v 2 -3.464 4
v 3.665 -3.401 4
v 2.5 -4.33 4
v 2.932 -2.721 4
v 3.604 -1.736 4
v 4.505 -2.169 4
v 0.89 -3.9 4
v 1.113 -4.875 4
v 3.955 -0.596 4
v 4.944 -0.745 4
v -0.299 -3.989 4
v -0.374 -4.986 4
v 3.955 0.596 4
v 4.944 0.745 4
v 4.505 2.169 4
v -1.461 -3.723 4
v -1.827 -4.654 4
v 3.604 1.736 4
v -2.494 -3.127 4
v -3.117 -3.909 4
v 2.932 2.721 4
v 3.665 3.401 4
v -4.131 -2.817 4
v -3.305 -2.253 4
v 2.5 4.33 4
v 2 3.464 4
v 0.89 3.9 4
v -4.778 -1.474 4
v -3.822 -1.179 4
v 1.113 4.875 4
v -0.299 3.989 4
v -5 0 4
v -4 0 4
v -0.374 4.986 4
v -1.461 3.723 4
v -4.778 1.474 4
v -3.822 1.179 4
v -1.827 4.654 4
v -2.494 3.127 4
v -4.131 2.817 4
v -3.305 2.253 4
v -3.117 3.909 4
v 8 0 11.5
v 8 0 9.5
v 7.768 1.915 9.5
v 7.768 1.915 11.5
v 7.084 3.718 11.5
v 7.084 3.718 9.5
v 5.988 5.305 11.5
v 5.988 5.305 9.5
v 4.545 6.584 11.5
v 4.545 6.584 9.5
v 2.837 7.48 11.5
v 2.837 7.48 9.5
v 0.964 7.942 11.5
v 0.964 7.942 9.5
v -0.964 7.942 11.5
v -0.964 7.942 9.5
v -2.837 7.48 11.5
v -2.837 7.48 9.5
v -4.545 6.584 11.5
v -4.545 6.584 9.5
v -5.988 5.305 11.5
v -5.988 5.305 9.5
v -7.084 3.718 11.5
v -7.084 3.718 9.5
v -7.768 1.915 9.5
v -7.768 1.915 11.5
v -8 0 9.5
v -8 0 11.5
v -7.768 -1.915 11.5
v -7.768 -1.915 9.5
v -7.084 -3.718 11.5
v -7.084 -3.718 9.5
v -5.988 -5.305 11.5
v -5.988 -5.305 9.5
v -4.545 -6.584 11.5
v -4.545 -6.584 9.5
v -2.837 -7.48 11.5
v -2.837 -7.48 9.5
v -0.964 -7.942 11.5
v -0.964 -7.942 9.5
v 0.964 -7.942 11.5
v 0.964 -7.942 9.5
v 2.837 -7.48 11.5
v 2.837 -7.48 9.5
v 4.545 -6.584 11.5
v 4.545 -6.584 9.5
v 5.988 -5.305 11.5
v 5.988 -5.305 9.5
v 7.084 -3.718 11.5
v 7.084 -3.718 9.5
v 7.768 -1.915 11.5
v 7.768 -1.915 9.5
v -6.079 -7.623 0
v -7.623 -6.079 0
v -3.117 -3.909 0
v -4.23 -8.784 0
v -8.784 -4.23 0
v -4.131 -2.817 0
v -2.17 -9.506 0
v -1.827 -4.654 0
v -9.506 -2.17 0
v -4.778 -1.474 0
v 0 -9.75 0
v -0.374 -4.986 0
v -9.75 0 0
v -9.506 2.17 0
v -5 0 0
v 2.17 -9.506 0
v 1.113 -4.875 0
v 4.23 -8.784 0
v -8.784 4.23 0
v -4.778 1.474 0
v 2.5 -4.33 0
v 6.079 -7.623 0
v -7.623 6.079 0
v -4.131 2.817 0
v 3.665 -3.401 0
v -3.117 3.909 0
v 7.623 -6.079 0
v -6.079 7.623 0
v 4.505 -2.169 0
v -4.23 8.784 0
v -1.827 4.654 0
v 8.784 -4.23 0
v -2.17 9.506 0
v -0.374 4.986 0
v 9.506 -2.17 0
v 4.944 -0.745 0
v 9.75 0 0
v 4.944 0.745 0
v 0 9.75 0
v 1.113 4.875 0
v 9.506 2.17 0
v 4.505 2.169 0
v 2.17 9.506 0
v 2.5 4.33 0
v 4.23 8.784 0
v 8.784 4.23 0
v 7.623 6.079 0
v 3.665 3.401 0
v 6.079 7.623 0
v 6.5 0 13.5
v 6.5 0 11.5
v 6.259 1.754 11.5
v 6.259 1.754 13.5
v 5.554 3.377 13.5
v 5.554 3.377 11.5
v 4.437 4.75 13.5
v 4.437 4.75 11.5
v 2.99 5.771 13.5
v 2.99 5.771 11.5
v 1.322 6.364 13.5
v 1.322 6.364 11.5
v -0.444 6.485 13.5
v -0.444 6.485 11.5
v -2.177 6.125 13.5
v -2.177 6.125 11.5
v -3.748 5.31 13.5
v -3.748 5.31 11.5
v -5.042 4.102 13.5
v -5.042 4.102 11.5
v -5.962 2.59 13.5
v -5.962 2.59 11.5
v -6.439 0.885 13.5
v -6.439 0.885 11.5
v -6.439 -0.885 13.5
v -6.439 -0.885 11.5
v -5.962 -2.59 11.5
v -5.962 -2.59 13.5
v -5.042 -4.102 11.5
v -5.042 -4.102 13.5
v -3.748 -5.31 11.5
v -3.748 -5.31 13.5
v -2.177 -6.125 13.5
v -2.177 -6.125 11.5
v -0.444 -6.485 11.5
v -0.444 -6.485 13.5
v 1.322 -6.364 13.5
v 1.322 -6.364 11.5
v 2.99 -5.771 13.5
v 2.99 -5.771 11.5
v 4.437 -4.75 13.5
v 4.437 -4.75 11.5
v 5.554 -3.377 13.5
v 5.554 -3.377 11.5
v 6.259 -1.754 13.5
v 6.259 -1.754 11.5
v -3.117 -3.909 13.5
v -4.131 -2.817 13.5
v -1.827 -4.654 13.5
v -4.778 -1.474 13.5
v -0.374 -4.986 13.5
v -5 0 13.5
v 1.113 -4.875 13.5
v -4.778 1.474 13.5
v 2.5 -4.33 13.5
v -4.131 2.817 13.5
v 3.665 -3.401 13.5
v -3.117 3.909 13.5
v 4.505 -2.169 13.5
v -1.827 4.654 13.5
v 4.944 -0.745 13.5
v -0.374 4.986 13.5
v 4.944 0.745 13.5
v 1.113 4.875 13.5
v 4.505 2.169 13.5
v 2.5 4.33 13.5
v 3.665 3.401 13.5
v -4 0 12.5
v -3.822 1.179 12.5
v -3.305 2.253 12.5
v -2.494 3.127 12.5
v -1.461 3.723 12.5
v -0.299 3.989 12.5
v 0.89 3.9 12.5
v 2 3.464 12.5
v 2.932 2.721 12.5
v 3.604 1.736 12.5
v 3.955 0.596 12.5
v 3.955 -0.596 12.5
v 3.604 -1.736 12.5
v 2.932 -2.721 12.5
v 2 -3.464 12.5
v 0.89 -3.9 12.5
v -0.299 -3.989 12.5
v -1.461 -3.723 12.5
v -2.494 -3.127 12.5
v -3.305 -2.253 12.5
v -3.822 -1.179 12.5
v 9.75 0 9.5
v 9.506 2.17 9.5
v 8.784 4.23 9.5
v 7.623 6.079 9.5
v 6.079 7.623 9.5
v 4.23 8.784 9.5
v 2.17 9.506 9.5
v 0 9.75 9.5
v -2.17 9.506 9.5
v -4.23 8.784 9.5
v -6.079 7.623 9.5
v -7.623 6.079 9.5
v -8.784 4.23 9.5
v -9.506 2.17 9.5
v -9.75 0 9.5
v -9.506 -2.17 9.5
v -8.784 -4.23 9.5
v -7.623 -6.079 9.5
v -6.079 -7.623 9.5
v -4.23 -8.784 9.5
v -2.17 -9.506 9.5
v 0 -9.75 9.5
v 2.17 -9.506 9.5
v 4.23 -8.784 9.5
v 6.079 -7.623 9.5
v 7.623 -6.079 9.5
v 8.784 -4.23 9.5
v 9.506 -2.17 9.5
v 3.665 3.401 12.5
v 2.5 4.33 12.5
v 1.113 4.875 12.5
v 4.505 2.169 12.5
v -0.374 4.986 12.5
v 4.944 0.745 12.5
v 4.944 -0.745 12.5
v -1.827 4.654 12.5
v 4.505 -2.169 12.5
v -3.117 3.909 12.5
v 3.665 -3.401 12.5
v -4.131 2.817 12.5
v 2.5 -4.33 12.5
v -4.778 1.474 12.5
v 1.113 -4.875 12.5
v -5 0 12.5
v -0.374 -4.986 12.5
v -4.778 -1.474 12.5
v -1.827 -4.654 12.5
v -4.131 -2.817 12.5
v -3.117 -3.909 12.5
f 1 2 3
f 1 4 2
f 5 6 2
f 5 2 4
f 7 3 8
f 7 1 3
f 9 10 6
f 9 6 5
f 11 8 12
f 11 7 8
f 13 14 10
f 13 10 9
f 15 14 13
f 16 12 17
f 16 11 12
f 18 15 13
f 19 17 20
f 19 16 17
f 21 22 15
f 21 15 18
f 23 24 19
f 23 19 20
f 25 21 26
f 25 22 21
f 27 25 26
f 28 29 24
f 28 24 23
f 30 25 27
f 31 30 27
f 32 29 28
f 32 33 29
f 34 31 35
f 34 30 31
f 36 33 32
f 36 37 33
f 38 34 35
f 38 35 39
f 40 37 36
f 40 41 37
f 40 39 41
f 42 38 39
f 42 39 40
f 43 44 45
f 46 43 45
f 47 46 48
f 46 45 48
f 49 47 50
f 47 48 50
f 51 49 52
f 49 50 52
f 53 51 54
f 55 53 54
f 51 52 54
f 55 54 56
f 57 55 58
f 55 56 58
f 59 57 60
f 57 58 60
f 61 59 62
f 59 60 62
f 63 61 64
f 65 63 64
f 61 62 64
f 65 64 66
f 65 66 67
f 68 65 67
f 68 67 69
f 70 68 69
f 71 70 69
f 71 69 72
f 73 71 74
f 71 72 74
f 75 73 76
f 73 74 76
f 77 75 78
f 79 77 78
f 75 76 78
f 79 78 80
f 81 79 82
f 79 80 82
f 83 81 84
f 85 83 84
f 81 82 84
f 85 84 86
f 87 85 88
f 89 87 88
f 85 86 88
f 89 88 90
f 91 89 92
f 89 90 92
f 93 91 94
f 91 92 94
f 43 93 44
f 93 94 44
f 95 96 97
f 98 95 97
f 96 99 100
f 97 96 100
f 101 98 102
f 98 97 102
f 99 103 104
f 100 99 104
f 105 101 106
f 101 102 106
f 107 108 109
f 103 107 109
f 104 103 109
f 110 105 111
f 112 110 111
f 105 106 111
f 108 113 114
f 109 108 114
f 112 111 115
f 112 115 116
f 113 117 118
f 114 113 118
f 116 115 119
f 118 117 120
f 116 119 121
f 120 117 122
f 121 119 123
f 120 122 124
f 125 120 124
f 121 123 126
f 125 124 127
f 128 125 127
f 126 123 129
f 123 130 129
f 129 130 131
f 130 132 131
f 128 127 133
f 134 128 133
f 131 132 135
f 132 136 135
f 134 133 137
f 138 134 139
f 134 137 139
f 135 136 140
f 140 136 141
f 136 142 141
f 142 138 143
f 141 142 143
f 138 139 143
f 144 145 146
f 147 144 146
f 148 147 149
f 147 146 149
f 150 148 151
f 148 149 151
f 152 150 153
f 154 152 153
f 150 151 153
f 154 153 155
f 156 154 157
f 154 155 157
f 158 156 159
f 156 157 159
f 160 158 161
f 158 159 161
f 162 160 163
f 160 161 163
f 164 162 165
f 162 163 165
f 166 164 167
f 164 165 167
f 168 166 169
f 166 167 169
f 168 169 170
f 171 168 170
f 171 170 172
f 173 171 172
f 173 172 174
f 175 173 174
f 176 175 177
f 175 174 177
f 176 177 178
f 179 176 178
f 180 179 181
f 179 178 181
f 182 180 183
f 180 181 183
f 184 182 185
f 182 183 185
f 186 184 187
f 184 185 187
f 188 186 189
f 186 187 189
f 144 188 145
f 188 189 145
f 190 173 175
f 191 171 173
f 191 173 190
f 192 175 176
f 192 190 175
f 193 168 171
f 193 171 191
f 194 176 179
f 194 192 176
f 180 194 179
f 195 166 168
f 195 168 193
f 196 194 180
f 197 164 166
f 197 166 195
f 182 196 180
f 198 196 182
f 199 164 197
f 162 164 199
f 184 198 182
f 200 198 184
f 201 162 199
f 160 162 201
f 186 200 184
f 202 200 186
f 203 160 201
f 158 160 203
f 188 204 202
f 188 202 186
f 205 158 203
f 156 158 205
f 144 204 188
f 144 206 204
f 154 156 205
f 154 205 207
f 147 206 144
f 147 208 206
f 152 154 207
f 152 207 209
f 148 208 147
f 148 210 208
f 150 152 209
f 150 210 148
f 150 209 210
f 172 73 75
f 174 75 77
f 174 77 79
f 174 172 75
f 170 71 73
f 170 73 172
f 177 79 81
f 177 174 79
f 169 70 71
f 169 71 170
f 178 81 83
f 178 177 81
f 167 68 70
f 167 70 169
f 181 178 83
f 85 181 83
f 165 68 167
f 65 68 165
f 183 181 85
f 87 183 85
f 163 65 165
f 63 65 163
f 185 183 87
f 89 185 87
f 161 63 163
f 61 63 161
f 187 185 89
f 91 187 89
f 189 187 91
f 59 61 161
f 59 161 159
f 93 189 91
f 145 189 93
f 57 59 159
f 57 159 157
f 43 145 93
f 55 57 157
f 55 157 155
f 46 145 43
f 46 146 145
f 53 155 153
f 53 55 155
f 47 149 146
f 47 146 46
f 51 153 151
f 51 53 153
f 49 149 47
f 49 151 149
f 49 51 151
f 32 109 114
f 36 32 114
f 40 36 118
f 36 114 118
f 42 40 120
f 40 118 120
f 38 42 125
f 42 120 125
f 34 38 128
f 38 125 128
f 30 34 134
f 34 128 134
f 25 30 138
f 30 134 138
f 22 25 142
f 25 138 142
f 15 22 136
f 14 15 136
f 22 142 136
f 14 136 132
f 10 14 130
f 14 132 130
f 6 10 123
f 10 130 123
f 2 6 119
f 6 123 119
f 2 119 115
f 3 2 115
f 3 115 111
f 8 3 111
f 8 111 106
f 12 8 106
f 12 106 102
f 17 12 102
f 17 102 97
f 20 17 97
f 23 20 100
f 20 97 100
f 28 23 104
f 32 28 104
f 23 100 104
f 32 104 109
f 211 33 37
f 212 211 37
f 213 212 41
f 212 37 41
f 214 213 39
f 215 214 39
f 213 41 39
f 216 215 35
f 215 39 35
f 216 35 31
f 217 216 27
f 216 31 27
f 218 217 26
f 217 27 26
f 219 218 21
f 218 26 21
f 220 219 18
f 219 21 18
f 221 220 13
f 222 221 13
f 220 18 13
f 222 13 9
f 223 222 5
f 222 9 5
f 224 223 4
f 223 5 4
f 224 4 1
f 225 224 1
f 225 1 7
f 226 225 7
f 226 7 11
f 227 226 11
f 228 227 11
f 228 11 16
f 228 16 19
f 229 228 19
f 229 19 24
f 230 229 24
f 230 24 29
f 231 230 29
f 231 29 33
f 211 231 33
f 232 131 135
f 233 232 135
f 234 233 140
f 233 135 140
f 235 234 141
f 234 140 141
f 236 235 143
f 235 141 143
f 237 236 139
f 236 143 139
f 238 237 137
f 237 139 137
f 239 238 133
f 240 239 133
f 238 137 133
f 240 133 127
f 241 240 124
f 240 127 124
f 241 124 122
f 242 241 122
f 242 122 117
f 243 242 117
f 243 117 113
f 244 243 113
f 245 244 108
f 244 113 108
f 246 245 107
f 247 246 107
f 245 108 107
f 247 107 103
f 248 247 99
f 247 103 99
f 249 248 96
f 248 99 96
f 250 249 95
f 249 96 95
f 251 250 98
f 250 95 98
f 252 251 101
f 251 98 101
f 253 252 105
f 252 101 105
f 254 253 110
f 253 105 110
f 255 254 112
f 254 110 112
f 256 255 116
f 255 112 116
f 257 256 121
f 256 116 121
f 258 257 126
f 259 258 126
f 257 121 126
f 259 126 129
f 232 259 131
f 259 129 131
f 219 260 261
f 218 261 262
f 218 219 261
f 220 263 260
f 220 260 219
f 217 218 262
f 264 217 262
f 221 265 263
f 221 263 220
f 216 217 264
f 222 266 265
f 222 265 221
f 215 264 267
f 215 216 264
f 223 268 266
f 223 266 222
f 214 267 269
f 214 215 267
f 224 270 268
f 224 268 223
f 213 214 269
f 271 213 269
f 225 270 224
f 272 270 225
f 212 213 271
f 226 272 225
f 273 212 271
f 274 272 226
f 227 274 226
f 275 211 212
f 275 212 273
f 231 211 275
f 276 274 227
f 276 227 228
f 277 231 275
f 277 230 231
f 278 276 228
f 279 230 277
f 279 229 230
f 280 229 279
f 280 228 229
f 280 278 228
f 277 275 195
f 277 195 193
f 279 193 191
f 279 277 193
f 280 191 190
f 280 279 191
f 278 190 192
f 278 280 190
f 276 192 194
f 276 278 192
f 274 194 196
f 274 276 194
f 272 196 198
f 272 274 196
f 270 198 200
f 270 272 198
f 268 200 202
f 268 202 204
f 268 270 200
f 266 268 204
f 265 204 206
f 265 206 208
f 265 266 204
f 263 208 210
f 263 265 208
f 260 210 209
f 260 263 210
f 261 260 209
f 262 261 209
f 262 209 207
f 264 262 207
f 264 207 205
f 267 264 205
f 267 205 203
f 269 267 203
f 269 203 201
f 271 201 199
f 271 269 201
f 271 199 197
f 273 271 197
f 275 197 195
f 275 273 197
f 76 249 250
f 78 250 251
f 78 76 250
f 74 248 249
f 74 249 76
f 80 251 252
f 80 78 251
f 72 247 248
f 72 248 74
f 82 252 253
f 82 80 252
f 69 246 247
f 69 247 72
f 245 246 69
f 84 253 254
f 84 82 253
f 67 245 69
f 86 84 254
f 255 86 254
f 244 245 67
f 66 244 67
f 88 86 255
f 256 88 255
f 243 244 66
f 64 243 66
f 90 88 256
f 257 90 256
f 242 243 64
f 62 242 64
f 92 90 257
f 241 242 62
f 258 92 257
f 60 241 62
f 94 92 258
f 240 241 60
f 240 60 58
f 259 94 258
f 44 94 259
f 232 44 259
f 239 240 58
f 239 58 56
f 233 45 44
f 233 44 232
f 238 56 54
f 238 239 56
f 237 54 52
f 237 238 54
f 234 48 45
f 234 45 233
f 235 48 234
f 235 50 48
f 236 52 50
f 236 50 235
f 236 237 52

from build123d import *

# Parameters (mm, degrees)
SKETCH_1_R          = 9.75
EXTRUDE_1_DEPTH     = 9.5
SKETCH_2_R          = 8
EXTRUDE_2_DEPTH     = 2
SKETCH_3_R          = 6.5
EXTRUDE_3_DEPTH     = 2
SKETCH_4_R          = 4
CUT_EXTRUDE_1_DEPTH = 20.297020495
SKETCH_5_R          = 5
CUT_EXTRUDE_2_DEPTH = 4
CUT_EXTRUDE_START   = -1
SKETCH_6_R          = 5
CUT_EXTRUDE_3_DEPTH = 1


with BuildPart() as part:
    # 스케치1 → 돌출1 (new body)
    with BuildSketch(Plane.XY):
        Circle(SKETCH_1_R)
    extrude(amount=EXTRUDE_1_DEPTH)

    # 스케치2 → 돌출2 (add)
    with BuildSketch(Plane.XY.offset(9.5)):
        Circle(SKETCH_2_R)
    extrude(amount=EXTRUDE_2_DEPTH)

    # 스케치3 → 돌출3 (add)
    with BuildSketch(Plane.XY.offset(11.5)):
        Circle(SKETCH_3_R)
    extrude(amount=EXTRUDE_3_DEPTH)

    # 스케치4 → 컷-돌출1 (cut, through all)
    with BuildSketch(Plane(origin=(0, 0, 0), x_dir=(-1, 0, 0), z_dir=(0, 0, -1))):
        Circle(SKETCH_4_R)
    extrude(amount=-CUT_EXTRUDE_1_DEPTH, mode=Mode.SUBTRACT)

    # 스케치5 → 컷-돌출2 (cut)
    with BuildSketch(Plane(origin=(0, 0, 0), x_dir=(-1, 0, 0), z_dir=(0, 0, -1))):
        Circle(SKETCH_5_R)
    extrude(amount=-CUT_EXTRUDE_2_DEPTH, mode=Mode.SUBTRACT)

    # 스케치6 → 컷-돌출3 (cut)
    with BuildSketch(Plane.XY.offset(13.5).offset(CUT_EXTRUDE_START)):
        with Locations(Location((0, 0, 0), (0, 0, 180))):
            Circle(SKETCH_6_R)
    extrude(amount=CUT_EXTRUDE_3_DEPTH, mode=Mode.SUBTRACT)


solid = part.part
